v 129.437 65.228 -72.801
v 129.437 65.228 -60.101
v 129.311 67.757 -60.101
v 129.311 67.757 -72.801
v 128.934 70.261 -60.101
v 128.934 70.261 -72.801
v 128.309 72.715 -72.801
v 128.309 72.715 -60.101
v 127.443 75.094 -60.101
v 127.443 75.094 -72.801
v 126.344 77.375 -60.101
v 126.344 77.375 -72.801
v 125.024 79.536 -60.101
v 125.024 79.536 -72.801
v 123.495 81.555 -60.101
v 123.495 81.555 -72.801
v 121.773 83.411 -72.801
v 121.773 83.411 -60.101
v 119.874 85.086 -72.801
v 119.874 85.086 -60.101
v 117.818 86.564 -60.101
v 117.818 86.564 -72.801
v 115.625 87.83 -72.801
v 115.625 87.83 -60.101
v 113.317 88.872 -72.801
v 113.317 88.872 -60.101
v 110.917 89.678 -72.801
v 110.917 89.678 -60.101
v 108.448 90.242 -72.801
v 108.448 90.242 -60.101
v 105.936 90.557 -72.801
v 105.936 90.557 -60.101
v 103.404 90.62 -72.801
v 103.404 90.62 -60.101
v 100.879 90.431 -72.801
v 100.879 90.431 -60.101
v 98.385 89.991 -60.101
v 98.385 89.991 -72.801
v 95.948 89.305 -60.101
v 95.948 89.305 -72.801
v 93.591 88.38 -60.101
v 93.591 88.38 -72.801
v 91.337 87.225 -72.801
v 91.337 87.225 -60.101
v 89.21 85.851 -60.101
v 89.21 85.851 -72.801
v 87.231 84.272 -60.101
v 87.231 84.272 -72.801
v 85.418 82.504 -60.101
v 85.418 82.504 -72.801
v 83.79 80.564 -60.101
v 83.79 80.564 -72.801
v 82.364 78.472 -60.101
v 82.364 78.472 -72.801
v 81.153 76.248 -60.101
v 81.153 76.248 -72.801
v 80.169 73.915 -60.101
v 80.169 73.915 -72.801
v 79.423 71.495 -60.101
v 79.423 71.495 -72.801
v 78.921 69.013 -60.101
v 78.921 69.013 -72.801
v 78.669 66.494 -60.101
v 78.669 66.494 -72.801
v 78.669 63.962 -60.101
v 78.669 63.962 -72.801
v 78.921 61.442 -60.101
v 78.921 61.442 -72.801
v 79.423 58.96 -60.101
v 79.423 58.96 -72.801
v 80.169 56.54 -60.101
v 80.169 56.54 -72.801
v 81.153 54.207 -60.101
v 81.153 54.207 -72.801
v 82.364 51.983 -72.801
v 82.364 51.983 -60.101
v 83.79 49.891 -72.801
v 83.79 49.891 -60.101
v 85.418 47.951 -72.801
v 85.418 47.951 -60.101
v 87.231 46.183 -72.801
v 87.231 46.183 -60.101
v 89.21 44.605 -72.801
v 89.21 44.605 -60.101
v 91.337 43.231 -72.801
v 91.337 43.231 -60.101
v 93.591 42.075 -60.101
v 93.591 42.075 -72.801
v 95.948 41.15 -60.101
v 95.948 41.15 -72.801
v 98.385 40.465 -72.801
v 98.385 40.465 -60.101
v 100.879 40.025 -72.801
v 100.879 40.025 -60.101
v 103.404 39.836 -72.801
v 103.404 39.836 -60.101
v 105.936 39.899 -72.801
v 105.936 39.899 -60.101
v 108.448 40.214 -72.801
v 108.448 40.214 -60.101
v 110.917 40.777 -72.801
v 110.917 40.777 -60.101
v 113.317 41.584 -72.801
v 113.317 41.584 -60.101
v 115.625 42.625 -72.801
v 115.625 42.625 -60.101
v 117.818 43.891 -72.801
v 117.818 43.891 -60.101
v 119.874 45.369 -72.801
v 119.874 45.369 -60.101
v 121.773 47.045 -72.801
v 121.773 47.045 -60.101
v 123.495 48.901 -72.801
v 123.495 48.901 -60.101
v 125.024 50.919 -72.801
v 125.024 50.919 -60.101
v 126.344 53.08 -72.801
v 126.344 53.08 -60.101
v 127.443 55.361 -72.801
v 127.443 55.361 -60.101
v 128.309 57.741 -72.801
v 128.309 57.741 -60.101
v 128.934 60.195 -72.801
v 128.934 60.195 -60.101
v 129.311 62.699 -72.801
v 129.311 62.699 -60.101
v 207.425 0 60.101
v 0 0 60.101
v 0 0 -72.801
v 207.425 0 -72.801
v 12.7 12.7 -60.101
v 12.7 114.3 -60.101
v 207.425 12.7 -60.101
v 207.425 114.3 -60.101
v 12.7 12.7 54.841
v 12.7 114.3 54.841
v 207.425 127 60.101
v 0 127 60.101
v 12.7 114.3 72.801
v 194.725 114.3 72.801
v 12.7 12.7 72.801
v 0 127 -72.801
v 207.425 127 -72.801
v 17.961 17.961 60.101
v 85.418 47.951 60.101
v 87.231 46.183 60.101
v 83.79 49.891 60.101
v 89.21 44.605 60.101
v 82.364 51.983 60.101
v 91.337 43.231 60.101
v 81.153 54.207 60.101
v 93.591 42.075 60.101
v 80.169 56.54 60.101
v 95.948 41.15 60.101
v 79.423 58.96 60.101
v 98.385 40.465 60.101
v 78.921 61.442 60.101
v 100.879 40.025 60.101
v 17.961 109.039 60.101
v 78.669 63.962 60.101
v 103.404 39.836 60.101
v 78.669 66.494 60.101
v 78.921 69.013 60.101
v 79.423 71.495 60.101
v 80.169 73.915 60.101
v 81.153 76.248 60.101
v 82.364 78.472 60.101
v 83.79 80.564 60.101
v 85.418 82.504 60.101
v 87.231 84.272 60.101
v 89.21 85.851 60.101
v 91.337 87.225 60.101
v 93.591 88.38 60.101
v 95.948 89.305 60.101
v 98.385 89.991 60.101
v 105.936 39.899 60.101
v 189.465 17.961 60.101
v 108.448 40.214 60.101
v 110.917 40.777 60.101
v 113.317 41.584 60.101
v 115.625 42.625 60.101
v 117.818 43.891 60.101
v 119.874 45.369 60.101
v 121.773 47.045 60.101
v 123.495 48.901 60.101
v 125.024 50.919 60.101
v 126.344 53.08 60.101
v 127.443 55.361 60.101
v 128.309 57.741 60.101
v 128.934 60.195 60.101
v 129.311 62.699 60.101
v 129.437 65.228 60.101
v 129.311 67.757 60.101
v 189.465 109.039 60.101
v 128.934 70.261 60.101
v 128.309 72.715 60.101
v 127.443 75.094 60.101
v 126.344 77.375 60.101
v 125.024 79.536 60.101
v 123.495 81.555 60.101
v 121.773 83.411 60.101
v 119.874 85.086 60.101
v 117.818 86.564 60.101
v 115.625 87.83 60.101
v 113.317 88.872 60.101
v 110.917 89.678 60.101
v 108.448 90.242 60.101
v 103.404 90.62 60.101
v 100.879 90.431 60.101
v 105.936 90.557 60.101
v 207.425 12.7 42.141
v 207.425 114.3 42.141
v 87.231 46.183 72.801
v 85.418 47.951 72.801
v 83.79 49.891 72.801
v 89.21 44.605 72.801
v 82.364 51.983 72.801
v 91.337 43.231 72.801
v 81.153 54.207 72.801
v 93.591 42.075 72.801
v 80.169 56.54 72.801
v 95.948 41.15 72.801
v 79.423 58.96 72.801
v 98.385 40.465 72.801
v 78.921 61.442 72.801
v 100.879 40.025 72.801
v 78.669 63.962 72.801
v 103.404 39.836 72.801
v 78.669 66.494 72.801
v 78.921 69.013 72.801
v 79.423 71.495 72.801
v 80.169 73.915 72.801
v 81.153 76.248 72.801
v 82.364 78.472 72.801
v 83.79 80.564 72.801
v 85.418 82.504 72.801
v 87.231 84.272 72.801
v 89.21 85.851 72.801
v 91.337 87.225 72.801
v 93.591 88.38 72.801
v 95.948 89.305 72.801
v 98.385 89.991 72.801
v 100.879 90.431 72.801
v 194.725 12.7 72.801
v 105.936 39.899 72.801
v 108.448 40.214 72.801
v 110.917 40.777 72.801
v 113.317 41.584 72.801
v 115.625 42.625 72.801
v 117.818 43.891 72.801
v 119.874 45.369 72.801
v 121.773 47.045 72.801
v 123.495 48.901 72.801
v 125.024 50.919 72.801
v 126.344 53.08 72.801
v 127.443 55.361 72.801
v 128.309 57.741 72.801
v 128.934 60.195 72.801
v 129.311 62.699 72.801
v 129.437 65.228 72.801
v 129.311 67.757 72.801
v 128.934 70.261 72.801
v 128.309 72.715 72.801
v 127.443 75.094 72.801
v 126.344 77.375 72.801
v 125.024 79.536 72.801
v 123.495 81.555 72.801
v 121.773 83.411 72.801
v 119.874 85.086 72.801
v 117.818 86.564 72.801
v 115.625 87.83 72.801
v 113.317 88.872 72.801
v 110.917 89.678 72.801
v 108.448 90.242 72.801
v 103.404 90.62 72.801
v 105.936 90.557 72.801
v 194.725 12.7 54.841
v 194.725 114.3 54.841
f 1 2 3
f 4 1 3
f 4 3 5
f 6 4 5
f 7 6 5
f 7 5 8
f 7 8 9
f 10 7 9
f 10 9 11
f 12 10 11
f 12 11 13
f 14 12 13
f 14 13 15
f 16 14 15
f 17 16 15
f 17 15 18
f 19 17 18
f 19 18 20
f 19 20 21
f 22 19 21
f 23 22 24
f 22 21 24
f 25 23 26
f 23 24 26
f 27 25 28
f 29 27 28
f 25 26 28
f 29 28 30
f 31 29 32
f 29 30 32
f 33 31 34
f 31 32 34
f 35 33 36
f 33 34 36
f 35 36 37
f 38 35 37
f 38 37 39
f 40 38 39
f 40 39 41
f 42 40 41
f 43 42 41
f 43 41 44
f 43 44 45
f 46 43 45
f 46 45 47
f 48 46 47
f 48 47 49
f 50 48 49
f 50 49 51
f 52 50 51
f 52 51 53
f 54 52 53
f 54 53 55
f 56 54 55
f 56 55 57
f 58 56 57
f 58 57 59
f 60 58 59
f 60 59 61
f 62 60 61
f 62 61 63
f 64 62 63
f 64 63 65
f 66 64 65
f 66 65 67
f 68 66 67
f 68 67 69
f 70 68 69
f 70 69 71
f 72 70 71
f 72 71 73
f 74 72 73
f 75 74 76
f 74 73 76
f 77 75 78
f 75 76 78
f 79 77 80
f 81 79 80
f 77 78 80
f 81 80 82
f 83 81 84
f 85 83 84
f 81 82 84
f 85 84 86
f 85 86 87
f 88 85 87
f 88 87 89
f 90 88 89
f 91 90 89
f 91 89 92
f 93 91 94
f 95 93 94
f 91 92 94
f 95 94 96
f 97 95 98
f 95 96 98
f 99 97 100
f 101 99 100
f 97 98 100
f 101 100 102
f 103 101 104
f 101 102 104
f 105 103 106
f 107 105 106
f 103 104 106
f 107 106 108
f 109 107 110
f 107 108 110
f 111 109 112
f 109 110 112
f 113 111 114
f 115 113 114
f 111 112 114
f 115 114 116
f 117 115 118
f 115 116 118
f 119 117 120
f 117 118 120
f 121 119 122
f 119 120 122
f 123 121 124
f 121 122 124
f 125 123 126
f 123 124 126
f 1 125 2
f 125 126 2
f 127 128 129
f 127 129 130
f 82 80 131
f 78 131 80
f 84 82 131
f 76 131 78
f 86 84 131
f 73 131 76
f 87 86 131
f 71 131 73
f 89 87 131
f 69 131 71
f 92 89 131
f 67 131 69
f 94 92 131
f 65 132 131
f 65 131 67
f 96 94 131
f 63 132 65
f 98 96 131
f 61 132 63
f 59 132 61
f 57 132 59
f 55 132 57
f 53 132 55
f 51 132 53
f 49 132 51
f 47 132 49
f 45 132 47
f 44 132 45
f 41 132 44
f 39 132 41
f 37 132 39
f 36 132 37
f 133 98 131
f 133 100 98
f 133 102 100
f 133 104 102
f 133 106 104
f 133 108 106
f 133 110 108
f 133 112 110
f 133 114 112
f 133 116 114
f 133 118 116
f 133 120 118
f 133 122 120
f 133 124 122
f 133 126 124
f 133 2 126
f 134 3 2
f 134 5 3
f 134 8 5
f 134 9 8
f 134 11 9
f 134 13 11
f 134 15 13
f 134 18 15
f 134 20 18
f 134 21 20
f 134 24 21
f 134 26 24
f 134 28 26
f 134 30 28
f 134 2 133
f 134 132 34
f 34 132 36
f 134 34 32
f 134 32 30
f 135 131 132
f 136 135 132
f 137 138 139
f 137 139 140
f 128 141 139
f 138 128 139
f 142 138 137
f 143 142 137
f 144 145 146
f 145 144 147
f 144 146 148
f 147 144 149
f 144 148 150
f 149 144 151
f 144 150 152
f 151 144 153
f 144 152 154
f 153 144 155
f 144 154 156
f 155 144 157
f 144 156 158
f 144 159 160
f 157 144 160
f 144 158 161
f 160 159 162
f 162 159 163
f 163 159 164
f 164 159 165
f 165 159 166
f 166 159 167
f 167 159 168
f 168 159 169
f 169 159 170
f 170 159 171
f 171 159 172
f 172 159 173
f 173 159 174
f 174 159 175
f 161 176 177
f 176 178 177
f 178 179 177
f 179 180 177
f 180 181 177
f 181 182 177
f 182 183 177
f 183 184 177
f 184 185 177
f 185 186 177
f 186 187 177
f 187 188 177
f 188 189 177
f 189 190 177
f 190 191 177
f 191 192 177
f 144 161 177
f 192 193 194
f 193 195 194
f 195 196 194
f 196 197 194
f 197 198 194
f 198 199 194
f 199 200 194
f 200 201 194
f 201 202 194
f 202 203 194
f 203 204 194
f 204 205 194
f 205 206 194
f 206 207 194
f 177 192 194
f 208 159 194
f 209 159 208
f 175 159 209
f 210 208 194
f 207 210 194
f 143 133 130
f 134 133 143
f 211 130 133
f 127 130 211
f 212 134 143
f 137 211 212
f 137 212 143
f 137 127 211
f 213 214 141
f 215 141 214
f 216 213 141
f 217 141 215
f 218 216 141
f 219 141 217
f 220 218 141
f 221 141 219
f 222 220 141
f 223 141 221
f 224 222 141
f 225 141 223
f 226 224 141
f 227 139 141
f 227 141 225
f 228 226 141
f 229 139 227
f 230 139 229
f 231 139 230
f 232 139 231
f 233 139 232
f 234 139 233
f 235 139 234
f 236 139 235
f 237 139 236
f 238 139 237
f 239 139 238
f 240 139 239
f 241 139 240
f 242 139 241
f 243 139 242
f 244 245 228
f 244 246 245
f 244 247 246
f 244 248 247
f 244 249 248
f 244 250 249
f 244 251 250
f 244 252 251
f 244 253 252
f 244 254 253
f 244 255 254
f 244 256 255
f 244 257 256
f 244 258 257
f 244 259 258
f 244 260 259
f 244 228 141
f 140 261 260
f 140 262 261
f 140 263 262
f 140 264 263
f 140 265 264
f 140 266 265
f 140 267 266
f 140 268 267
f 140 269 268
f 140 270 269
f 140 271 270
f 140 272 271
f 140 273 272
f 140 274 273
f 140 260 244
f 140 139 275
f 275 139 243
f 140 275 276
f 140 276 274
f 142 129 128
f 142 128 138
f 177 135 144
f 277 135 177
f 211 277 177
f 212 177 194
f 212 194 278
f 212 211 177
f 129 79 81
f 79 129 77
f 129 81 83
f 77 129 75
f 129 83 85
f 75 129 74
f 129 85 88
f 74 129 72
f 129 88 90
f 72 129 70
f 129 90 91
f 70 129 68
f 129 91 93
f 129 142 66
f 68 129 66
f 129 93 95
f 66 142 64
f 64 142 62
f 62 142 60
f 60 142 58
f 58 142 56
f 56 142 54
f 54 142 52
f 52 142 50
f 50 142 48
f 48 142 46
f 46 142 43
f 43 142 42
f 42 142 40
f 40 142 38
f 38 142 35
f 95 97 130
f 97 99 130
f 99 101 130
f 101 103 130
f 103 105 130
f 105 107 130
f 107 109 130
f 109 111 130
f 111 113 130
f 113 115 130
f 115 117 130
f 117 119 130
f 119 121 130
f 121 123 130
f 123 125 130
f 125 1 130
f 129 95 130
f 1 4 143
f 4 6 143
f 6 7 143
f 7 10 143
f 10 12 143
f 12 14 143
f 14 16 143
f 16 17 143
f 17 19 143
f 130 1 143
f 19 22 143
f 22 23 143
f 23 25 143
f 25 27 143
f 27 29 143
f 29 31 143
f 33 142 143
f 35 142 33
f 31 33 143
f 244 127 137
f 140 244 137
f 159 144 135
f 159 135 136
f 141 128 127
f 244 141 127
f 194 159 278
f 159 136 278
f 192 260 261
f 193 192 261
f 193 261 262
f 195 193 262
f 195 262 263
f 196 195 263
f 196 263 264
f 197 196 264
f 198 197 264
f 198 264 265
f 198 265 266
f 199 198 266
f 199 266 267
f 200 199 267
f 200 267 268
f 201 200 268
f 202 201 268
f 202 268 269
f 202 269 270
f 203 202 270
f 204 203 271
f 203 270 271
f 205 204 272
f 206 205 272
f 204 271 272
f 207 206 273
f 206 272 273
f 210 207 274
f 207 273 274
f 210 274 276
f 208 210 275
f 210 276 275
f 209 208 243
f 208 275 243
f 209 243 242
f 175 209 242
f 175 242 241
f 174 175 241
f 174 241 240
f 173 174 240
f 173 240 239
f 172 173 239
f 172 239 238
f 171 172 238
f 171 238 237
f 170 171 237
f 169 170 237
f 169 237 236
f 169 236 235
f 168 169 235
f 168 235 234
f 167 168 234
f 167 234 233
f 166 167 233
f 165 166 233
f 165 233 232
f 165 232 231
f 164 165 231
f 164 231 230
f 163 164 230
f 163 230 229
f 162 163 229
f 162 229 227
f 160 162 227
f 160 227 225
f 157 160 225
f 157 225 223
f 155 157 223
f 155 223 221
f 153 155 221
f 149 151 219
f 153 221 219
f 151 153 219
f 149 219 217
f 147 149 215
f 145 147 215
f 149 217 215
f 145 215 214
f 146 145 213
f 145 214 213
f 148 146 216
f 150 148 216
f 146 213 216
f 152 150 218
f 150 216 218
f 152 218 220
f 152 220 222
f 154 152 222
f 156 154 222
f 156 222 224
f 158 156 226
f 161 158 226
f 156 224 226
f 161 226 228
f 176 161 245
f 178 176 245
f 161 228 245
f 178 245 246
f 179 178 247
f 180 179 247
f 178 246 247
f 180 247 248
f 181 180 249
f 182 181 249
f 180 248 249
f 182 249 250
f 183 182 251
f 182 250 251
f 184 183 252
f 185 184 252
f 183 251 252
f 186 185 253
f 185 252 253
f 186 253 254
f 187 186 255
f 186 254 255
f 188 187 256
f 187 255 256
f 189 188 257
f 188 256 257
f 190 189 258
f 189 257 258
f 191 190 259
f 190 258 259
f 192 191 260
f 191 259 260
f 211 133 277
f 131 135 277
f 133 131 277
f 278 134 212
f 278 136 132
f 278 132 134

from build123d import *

# Parameters (mm, degrees)
F0_W     = 207.425324
F0_H     = 127
F1_DEPTH = 72.80146
F2_SIZE  = 12.7
F3_T     = -12.7
F4_R     = 25.4
F5_DEPTH = 148.94068


with BuildPart() as f1:
    # F0 (on Top) → F1 (new body, symmetric)
    with BuildSketch(Plane.XY):
        with Locations((103.712662, 63.5)):
            Rectangle(F0_W, F0_H)
    extrude(amount=F1_DEPTH, both=True)

    # F2
    f2_edges = [f1.edges().sort_by_distance(p)[0] for p in [
        (207.425324, 63.5, 72.80146),
        (103.712662, 127, 72.80146),
        (0, 63.5, 72.80146),
        (103.712662, 0, 72.80146),
    ]]
    chamfer(f2_edges, length=F2_SIZE)

    # F3
    f3_openings = [f1.faces().sort_by_distance(p)[0] for p in [
        (207.425324, 63.5, -6.35),
    ]]
    offset(amount=F3_T, openings=f3_openings)

    # F4 (on face) → F5 (cut)
    with BuildSketch(Plane.XY.offset(72.80146)):
        with Locations((104.037382, 65.22774)):
            Circle(F4_R)
    extrude(amount=-F5_DEPTH, mode=Mode.SUBTRACT)


solid = f1.part
